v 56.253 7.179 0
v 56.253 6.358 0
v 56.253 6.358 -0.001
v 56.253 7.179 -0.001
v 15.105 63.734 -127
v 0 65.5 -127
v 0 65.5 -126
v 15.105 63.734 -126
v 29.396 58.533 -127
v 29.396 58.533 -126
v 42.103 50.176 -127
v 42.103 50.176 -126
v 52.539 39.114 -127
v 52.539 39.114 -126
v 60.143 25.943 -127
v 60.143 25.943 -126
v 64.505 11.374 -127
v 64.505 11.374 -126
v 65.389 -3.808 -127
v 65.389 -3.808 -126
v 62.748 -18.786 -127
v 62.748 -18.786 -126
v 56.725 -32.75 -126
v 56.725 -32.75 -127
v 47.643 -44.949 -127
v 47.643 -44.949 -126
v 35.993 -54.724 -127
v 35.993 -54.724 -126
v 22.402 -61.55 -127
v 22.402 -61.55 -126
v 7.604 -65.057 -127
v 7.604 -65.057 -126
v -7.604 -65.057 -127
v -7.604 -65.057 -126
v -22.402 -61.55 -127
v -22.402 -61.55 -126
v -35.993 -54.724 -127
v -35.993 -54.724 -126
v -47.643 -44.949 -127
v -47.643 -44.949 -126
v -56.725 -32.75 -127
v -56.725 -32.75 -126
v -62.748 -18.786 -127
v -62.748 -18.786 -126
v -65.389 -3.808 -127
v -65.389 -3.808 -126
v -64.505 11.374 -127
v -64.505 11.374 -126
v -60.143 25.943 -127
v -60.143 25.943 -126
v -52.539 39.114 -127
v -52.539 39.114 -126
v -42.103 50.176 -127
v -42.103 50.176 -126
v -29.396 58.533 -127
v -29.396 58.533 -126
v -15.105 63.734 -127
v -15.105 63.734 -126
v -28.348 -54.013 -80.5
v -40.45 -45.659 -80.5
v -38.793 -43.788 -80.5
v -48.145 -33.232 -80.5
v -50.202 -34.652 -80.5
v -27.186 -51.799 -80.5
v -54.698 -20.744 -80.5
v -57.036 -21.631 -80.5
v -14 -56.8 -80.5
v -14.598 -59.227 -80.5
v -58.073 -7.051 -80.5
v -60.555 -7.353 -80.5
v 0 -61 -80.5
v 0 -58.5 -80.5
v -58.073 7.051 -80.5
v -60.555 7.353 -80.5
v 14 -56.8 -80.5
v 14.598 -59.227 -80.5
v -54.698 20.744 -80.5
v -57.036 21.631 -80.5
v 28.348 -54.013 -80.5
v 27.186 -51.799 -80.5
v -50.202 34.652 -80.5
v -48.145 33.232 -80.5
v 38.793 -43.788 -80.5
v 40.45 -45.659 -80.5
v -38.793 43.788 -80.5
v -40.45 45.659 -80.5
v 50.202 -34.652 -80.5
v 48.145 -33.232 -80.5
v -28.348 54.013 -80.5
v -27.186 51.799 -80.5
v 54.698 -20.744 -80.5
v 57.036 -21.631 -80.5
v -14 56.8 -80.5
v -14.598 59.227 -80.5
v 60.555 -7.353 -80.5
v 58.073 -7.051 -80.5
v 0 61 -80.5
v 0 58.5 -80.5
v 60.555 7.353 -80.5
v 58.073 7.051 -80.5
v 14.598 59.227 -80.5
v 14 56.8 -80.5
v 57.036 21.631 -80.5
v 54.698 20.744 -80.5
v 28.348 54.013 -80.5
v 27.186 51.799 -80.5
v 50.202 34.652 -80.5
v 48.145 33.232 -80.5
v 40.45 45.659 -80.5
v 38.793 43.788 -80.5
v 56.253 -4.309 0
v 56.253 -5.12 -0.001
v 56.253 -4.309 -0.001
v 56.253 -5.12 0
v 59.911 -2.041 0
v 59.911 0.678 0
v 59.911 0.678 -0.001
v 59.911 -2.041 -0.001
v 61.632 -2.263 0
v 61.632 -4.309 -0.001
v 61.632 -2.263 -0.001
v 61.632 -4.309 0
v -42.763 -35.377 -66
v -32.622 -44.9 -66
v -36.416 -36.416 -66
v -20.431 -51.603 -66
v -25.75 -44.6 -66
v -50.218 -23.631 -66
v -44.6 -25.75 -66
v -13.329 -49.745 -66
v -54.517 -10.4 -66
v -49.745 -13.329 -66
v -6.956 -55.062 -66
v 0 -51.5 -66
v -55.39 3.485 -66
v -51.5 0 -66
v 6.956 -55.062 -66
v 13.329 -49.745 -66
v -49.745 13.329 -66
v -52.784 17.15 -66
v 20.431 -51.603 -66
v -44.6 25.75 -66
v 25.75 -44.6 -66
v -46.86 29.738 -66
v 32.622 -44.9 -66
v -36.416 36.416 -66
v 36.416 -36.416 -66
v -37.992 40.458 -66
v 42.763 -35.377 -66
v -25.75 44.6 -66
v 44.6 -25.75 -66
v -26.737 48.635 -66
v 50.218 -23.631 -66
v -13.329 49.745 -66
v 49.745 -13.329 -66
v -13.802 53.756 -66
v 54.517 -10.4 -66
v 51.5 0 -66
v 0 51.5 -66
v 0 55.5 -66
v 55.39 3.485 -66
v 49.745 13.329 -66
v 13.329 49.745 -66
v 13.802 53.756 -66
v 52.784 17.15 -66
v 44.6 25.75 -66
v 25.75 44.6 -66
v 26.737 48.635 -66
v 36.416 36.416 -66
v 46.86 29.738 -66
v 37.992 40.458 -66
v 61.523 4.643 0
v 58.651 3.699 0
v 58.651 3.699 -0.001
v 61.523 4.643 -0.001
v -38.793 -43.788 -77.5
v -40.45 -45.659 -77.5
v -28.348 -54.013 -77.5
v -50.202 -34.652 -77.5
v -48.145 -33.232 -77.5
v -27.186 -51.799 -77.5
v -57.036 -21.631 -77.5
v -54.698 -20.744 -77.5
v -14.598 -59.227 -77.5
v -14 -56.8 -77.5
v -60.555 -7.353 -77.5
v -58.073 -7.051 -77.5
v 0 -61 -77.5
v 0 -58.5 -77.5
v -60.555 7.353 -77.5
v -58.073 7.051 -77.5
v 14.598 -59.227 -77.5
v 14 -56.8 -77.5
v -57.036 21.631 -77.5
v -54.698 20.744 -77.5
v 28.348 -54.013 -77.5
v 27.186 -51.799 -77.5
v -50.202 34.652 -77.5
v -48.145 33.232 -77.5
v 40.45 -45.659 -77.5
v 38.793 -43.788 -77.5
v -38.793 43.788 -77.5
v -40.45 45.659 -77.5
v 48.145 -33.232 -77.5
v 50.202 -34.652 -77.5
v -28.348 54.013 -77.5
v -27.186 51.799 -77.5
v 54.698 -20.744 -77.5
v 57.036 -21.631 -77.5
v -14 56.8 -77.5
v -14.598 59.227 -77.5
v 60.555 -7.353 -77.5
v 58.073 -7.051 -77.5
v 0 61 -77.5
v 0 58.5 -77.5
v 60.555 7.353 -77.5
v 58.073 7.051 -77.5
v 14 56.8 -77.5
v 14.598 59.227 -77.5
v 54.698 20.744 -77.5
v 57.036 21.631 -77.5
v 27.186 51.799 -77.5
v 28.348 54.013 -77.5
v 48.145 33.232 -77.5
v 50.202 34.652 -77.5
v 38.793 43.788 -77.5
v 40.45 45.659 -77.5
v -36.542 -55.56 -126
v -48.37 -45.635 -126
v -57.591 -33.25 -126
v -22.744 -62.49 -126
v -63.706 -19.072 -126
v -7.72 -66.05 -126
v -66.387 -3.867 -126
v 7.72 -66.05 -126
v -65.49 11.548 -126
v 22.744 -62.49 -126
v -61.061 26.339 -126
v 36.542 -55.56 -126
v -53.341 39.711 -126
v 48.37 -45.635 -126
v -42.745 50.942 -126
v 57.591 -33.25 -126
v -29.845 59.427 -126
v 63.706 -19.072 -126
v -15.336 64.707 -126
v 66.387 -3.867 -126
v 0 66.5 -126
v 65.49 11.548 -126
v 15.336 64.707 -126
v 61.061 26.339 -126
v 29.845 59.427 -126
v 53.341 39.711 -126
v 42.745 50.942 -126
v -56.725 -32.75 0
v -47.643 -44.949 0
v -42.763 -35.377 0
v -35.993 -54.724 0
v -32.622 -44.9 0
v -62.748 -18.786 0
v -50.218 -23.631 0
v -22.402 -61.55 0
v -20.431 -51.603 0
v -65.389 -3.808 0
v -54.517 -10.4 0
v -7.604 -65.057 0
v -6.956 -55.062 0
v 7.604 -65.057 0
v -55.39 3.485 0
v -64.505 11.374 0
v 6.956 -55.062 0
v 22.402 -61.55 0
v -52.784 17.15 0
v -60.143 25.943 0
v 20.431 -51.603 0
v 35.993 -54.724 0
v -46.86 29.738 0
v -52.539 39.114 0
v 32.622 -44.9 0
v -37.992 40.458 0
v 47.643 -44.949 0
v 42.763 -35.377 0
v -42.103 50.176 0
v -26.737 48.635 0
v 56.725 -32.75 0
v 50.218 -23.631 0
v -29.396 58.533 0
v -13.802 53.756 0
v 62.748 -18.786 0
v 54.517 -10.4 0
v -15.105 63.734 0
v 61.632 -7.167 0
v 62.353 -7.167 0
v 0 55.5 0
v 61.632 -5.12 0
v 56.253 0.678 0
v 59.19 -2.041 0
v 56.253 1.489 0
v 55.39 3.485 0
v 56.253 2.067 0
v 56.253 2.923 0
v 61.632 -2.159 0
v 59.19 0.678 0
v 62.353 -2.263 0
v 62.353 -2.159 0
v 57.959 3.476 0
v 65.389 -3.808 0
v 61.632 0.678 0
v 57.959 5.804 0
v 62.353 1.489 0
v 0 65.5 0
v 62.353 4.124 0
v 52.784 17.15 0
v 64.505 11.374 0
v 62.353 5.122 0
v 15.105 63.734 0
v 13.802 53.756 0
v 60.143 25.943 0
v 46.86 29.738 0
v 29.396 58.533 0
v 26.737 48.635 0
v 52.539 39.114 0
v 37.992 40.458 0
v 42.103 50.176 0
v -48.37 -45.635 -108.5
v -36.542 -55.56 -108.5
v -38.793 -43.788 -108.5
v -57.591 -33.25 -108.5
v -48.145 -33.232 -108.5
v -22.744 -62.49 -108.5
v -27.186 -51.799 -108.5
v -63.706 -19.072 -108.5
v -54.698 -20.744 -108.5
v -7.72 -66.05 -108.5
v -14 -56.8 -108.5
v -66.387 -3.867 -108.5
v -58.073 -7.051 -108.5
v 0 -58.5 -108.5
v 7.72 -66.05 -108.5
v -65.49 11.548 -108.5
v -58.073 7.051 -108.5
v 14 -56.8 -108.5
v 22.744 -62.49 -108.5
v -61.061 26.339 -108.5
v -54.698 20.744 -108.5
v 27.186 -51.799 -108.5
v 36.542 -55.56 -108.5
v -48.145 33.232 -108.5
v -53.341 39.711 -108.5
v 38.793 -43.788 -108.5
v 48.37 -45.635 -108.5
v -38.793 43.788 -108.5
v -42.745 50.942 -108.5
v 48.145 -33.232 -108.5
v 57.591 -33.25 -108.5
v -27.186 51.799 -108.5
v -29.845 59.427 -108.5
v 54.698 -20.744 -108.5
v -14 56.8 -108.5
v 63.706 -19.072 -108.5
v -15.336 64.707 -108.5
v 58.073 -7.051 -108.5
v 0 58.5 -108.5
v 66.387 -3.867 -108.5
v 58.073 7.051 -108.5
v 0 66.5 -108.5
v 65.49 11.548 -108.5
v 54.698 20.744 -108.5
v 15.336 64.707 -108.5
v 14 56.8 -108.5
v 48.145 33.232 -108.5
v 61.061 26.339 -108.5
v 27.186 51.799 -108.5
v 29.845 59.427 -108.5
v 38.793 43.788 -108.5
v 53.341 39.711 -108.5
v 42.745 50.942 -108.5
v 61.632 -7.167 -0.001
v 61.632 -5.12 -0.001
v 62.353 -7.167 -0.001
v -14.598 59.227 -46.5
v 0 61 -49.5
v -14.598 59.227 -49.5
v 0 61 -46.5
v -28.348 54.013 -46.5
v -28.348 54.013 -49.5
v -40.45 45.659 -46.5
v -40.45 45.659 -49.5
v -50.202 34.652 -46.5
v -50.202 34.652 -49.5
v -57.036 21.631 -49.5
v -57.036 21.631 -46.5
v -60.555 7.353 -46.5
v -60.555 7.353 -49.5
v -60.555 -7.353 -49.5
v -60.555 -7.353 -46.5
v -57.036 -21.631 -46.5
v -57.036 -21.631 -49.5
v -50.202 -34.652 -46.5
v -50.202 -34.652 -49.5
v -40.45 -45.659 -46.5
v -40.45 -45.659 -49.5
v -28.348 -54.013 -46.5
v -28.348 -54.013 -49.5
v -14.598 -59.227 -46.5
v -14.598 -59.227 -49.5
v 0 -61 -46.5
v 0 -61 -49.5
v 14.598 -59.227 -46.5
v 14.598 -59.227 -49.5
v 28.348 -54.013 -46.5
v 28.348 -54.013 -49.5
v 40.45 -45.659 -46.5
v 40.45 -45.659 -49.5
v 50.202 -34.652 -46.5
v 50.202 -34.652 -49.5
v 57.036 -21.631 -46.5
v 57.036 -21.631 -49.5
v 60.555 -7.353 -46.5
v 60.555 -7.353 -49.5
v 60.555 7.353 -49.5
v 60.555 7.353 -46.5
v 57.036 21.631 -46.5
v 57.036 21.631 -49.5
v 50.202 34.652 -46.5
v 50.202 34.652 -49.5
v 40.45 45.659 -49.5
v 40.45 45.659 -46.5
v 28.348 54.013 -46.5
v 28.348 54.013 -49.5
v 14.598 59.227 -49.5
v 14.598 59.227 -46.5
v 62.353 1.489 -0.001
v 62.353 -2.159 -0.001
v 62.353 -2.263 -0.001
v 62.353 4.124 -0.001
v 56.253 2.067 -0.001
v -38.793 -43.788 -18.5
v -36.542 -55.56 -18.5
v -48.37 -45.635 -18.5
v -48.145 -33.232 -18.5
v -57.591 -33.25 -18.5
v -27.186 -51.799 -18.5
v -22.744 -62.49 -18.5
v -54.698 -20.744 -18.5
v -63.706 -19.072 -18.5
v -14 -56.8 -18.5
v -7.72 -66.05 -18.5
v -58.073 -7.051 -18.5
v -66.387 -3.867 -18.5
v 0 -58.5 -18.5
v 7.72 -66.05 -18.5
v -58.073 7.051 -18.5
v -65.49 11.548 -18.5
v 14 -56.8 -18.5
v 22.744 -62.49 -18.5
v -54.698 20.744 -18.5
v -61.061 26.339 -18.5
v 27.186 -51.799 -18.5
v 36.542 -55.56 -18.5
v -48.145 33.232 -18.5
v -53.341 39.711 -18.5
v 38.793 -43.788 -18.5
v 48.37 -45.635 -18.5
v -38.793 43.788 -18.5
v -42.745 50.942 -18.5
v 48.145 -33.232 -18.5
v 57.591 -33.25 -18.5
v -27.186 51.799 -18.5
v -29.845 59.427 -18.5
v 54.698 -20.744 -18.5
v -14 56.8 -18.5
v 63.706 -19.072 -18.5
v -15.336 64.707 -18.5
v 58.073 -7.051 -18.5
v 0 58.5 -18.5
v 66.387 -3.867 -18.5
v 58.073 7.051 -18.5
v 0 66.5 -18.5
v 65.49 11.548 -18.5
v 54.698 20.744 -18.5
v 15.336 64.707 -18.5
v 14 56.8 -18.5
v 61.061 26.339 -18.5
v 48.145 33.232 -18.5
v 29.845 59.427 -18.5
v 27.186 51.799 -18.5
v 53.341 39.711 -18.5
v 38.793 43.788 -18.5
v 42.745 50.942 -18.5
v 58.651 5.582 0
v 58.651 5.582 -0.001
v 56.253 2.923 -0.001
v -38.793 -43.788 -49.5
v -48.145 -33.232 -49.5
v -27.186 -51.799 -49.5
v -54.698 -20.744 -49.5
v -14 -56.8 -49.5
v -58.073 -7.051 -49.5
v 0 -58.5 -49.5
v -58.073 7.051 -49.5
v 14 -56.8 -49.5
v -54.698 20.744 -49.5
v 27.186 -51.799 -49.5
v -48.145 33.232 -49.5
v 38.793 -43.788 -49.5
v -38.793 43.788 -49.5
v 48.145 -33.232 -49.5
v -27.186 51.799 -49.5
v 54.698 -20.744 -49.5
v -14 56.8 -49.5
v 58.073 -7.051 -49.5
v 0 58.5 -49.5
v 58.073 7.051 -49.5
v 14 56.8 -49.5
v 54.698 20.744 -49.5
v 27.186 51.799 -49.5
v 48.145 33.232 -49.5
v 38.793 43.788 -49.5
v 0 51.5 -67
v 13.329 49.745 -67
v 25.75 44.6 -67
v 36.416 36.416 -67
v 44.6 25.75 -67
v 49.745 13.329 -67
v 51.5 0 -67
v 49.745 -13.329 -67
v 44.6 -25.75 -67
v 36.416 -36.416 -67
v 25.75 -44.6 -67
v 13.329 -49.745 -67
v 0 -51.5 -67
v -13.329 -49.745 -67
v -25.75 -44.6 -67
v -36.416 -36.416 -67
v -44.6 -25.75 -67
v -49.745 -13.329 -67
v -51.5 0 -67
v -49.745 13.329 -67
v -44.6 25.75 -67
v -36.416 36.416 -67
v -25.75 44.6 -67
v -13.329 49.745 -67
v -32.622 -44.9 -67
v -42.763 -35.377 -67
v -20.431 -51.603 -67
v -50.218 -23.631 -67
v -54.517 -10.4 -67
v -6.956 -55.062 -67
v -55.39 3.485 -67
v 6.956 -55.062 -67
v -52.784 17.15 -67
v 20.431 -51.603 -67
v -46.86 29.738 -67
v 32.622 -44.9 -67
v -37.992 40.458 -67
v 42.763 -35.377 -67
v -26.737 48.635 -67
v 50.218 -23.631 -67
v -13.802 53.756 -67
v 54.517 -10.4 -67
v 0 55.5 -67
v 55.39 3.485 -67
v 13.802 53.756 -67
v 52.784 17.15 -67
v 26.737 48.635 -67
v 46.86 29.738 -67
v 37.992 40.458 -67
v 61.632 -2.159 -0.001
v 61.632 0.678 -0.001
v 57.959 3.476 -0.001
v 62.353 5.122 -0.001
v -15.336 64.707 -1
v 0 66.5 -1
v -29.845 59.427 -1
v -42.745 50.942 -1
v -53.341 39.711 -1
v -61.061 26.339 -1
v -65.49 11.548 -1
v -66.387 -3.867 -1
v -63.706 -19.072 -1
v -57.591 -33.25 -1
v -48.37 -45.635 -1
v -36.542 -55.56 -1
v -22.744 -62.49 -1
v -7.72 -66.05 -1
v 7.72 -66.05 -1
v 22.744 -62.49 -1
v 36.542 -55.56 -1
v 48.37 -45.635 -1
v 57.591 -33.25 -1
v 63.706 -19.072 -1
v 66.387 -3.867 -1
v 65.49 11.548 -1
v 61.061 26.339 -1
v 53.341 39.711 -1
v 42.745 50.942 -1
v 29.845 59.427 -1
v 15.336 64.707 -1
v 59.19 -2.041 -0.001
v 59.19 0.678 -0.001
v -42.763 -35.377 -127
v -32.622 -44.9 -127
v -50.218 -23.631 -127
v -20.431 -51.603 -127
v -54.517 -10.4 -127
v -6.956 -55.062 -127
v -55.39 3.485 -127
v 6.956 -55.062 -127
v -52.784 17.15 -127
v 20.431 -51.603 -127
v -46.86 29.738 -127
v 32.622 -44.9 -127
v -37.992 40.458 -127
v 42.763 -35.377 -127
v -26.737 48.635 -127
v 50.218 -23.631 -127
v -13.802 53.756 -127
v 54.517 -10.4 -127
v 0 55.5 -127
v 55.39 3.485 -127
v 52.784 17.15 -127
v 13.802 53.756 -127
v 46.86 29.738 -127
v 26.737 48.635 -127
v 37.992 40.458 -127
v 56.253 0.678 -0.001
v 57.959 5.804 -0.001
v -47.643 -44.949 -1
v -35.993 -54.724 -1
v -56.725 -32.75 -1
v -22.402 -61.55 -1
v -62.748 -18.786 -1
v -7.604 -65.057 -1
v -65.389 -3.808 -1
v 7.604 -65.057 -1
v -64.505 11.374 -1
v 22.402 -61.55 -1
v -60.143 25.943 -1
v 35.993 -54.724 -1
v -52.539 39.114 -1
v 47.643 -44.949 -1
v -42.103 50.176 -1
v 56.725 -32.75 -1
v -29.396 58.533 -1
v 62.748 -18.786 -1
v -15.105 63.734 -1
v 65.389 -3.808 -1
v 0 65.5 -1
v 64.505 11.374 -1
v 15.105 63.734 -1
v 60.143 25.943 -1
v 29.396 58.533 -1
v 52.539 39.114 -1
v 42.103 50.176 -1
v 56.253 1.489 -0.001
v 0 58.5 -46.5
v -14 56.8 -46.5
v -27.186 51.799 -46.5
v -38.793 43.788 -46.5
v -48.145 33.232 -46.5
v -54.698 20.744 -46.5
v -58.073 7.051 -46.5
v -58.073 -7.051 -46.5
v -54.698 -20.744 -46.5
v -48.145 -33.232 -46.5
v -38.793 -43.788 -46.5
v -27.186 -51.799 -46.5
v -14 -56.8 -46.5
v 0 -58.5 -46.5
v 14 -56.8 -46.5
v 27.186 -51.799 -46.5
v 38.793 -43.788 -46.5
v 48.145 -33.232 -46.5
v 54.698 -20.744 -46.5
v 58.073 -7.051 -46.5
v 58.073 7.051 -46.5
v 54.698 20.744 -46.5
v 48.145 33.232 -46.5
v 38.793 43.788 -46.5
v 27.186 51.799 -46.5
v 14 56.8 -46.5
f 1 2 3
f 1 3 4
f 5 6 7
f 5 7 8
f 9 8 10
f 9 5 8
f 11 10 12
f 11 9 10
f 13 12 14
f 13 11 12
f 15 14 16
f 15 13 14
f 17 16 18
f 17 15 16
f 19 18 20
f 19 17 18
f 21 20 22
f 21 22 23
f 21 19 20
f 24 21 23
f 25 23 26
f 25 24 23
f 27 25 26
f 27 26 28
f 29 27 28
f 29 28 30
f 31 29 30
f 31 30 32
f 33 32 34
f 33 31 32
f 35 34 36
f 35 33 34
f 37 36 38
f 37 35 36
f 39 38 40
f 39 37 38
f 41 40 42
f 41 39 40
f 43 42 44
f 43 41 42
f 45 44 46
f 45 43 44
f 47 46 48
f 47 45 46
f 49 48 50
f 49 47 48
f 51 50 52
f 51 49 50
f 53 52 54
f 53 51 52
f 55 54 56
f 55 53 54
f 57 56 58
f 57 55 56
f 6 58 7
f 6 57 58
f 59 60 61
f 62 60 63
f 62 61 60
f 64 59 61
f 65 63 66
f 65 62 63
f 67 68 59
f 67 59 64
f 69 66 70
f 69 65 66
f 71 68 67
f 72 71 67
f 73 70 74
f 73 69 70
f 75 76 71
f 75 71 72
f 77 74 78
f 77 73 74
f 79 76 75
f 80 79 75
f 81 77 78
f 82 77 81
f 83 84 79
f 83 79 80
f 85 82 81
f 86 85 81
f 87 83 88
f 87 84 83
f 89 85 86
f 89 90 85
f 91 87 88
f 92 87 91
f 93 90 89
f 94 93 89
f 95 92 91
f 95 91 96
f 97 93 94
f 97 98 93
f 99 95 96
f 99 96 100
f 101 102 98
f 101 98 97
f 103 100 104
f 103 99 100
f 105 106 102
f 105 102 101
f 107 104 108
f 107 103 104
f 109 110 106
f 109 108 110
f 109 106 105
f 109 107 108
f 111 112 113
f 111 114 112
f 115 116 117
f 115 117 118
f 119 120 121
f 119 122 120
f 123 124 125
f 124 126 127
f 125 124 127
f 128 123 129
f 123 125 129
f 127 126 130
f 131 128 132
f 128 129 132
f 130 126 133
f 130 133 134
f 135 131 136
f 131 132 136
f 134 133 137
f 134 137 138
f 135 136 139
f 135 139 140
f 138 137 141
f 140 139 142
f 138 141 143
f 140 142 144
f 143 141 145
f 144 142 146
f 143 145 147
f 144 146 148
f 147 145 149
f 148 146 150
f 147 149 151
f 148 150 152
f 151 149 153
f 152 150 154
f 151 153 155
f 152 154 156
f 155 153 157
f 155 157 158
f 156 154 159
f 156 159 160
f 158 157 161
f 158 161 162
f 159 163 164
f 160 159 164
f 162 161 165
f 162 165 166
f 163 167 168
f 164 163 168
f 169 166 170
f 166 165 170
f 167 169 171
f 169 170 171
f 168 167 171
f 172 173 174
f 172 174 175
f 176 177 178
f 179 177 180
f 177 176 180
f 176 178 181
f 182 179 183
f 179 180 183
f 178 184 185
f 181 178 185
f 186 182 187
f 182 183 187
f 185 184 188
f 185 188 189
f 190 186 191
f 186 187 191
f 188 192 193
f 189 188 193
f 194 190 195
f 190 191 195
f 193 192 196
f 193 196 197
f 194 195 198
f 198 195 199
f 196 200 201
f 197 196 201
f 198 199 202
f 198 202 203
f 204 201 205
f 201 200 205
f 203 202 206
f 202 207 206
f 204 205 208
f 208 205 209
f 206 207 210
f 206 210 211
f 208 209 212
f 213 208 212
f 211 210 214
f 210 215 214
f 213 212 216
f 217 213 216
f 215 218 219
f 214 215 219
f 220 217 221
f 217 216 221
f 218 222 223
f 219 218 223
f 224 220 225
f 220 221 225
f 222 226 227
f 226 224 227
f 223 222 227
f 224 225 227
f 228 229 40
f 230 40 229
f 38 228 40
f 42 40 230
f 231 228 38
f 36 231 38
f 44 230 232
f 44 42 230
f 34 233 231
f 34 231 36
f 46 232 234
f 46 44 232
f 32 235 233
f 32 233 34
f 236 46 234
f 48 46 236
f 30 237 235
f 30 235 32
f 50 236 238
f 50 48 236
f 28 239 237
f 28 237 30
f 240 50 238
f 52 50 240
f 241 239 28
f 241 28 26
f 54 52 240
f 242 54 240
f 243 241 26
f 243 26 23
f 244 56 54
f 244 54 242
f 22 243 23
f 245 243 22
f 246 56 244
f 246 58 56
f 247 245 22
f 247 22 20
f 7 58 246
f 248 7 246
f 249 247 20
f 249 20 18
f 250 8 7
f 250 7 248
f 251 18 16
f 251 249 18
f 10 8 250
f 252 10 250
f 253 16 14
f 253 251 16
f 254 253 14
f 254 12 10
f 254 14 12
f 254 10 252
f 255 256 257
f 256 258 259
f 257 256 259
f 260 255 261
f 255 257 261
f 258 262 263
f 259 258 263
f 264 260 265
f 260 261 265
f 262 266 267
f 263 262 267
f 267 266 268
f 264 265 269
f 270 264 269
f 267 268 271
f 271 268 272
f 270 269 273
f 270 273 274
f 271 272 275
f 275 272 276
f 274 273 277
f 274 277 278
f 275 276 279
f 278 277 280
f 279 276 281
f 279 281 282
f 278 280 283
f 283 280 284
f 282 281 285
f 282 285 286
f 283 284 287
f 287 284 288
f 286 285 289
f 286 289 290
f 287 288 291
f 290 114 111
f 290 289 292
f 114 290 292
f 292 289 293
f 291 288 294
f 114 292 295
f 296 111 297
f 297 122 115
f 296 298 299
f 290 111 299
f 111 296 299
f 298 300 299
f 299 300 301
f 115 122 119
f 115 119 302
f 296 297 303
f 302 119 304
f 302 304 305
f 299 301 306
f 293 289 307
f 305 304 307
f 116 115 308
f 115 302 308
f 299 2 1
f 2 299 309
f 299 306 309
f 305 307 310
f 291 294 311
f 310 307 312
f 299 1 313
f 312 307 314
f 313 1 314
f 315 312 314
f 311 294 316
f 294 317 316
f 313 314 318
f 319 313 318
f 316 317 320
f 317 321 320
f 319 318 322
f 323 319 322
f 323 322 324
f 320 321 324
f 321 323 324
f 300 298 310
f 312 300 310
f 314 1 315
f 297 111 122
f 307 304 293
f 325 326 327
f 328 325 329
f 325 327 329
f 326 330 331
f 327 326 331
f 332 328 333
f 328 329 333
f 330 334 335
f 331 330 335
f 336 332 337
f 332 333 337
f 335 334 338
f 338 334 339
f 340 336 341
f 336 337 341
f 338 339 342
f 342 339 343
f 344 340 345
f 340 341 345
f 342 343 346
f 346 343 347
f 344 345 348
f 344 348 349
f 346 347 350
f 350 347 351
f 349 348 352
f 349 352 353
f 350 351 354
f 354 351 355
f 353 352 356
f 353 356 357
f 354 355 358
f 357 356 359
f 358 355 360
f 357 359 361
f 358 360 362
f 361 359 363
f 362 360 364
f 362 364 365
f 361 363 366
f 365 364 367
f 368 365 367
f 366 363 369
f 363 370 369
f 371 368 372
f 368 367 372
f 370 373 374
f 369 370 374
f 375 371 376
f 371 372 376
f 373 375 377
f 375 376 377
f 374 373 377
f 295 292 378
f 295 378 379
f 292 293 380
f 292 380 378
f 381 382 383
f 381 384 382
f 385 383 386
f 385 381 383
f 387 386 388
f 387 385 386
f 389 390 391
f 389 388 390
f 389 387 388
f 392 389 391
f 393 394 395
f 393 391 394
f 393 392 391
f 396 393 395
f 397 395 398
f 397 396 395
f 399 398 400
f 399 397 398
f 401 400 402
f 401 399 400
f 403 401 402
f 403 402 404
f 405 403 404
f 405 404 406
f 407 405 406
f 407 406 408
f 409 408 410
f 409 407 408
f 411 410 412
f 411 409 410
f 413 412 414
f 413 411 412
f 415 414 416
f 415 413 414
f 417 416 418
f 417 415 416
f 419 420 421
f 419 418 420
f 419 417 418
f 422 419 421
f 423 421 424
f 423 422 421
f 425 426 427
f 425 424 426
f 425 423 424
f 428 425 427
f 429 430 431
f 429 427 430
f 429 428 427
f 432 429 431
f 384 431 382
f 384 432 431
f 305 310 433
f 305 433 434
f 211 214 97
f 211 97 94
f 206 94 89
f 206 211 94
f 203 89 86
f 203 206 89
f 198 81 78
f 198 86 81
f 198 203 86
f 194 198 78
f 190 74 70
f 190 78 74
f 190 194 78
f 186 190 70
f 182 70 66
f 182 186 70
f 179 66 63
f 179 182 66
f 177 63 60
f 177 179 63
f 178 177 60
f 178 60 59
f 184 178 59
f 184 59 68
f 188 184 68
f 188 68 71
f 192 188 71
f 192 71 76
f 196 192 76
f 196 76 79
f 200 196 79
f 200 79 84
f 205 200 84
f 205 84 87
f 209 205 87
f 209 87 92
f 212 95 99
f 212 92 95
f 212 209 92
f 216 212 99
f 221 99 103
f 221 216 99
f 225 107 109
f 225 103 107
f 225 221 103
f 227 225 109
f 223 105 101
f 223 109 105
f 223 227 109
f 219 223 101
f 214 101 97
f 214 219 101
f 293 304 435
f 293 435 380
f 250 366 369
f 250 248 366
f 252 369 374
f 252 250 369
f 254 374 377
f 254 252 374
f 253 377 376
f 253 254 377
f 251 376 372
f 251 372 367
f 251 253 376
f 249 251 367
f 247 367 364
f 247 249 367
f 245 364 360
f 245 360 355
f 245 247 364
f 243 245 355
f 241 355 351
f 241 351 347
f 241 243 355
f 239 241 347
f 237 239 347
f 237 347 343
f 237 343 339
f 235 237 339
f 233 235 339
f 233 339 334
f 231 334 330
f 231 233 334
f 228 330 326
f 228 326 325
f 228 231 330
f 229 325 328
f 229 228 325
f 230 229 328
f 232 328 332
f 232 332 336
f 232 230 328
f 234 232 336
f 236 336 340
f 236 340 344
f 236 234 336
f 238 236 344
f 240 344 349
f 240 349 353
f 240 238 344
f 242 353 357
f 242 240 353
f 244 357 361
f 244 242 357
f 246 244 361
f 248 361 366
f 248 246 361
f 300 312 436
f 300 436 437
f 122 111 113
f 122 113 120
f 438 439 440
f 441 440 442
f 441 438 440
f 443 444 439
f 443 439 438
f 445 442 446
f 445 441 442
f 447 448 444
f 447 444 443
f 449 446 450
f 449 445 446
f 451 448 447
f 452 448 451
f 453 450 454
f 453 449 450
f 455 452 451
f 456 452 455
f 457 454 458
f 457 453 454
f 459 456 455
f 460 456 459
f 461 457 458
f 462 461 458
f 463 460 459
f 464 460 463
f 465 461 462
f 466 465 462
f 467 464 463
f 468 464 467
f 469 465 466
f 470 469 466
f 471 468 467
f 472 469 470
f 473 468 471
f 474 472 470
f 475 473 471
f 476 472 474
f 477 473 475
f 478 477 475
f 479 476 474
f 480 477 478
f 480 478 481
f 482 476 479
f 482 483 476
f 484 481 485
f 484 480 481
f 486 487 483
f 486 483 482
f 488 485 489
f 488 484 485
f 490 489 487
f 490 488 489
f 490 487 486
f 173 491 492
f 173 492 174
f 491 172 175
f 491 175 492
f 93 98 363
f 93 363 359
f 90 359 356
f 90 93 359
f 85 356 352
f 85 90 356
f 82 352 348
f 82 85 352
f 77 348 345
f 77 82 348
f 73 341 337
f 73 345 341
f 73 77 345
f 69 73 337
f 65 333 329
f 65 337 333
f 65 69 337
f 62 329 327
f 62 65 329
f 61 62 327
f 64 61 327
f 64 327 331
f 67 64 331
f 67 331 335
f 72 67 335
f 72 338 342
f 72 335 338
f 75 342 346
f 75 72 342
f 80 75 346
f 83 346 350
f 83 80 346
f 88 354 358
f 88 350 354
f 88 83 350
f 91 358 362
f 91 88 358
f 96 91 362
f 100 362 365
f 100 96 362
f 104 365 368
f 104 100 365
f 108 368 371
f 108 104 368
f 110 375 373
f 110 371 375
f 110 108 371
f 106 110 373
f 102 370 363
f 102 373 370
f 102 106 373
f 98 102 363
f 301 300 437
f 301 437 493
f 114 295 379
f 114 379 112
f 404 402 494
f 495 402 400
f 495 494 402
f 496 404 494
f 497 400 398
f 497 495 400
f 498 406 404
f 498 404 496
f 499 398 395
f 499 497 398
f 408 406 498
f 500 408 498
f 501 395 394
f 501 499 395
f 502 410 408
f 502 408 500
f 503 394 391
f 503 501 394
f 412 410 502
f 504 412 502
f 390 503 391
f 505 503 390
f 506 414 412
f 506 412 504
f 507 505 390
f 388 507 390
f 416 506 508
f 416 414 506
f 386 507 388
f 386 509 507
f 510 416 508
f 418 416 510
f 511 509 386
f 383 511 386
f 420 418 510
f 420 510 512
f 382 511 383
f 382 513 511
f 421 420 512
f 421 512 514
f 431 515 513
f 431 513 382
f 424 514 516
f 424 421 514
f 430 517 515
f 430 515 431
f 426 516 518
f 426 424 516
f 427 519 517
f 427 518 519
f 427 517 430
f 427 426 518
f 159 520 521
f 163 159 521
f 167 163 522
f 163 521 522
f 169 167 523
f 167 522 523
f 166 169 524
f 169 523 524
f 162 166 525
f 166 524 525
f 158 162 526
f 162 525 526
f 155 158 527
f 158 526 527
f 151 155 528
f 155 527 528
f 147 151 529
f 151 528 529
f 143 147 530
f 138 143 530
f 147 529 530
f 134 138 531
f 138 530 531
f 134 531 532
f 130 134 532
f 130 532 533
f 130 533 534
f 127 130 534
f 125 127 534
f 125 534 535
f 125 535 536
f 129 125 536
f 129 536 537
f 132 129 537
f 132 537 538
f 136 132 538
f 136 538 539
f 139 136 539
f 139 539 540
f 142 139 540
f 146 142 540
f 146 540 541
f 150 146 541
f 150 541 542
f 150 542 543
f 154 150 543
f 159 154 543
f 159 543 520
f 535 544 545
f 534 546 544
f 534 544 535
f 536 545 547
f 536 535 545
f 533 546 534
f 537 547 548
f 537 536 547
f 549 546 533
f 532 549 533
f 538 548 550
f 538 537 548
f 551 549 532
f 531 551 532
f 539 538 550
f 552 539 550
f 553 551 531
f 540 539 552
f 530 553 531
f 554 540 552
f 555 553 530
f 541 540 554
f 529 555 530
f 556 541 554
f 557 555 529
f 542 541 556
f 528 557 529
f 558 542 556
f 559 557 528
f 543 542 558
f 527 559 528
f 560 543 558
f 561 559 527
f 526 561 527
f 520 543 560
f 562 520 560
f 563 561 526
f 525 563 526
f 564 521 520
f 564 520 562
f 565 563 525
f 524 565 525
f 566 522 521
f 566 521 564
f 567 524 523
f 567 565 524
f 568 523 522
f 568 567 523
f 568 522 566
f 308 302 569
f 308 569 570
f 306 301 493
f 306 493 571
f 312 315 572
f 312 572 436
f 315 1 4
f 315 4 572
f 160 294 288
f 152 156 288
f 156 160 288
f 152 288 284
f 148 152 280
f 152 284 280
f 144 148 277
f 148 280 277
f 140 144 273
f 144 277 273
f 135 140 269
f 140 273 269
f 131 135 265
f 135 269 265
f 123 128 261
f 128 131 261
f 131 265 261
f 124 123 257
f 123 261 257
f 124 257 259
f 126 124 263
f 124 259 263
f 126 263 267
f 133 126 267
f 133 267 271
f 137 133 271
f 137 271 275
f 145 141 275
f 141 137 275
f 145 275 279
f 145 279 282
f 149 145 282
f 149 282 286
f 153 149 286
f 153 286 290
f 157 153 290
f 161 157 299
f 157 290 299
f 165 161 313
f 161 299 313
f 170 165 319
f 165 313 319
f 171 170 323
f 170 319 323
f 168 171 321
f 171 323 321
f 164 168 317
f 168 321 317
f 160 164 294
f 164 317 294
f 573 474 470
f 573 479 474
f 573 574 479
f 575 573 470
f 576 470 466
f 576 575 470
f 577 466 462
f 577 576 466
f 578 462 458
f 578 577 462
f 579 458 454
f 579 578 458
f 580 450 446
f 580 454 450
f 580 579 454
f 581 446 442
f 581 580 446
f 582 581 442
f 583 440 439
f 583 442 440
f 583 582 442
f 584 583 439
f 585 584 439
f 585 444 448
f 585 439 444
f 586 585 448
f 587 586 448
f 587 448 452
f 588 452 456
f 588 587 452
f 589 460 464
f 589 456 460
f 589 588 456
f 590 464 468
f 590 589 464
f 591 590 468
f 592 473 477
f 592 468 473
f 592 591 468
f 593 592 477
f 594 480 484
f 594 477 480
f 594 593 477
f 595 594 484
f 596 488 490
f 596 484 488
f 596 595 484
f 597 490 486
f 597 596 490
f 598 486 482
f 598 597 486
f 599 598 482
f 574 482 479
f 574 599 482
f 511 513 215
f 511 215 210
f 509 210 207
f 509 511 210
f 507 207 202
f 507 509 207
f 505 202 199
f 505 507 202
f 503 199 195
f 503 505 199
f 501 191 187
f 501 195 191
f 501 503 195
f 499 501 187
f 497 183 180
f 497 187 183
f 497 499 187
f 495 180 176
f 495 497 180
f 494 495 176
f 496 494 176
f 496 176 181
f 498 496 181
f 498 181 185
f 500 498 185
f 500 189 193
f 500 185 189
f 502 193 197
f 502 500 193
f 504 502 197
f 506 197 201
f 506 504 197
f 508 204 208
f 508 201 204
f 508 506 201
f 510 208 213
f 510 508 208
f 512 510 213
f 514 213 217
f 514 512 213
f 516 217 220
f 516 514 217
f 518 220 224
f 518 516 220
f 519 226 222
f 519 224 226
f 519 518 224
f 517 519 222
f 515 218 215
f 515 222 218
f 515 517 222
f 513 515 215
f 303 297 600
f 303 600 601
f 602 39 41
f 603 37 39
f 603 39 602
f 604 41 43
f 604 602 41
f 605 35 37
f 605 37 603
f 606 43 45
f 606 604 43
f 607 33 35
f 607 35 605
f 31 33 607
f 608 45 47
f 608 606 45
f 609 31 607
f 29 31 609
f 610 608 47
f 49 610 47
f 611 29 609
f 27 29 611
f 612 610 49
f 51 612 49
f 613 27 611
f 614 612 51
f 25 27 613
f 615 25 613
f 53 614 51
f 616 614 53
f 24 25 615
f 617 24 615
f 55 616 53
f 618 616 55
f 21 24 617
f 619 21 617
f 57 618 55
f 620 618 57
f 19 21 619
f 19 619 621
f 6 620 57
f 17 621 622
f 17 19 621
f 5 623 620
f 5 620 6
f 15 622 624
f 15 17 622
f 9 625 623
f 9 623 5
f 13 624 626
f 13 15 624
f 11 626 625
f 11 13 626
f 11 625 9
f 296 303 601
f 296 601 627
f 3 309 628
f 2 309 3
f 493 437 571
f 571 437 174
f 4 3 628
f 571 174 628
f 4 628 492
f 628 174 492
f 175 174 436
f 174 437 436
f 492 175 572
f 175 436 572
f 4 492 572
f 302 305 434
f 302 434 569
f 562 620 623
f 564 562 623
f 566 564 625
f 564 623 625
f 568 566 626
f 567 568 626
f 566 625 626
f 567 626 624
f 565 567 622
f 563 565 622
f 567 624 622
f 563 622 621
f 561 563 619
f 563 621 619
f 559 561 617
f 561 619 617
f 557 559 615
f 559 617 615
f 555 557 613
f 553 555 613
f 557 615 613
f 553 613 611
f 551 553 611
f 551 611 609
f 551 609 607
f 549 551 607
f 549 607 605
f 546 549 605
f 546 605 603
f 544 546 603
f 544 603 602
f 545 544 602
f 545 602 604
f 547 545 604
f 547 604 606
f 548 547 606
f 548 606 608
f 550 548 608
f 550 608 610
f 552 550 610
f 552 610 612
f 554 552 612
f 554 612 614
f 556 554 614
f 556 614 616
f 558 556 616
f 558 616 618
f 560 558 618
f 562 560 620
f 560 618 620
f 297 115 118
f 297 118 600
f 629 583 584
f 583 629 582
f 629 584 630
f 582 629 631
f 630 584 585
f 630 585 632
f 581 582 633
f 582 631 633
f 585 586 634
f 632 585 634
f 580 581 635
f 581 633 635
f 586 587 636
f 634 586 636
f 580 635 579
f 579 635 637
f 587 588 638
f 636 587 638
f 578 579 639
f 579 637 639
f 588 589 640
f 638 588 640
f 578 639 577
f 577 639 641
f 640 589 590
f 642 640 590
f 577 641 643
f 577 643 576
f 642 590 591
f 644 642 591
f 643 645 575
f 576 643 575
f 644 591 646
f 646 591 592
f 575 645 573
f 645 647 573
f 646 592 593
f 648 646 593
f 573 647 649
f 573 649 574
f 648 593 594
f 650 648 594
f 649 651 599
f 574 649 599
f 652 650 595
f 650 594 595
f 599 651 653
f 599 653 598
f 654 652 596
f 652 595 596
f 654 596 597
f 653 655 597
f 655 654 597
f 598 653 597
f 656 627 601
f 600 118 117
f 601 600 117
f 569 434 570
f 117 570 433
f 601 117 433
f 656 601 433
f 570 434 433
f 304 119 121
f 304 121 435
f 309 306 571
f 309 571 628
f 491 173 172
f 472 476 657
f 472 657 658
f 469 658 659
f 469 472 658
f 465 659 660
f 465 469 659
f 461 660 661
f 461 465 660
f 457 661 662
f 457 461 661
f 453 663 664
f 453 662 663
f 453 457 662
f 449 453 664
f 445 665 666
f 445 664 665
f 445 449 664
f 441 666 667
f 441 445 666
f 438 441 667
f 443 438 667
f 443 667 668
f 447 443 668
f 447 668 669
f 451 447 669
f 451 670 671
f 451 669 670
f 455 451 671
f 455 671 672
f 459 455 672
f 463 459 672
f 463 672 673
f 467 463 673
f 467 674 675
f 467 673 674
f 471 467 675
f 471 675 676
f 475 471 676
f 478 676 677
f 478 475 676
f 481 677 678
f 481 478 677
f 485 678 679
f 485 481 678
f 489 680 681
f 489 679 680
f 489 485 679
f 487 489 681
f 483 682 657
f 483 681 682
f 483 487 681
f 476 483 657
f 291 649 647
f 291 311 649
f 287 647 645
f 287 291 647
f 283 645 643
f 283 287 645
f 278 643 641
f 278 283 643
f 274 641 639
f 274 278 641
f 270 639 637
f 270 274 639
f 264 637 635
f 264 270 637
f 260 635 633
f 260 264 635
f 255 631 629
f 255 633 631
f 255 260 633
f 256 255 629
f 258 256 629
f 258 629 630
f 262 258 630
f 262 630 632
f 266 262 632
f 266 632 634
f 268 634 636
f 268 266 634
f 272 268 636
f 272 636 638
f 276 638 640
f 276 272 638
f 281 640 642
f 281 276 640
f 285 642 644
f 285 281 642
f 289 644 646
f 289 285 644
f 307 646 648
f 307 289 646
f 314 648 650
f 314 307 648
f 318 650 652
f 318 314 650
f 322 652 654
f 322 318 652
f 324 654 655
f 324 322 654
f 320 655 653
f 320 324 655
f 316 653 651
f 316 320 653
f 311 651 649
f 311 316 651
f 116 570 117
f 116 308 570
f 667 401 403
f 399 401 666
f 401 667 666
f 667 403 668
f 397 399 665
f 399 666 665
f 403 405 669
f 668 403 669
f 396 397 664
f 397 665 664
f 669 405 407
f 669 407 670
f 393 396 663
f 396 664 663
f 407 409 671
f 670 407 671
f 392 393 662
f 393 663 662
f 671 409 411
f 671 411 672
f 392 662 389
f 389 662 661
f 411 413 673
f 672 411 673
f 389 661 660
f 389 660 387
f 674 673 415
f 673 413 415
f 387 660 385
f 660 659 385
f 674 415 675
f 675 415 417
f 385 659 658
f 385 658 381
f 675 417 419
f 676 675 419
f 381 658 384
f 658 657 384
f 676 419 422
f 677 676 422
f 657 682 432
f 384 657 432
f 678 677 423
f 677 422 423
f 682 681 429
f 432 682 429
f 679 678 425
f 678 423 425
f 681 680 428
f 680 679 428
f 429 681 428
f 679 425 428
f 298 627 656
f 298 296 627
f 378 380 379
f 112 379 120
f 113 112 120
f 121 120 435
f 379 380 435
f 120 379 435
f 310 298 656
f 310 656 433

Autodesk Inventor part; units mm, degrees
ref_plane "YZ Plane" through (0, 0, 0) normal (1, 0, 0) x (0, 1, 0)
ref_plane "XZ Plane" through (0, 0, 0) normal (0, 1, 0) x (-1, 0, 0)
ref_plane "XY Plane" through (0, 0, 0) normal (0, 0, 1) x (1, 0, 0)
sketch "Sketch1" plane through (0, 0, 0) normal (1, 0, 0) x (0, 1, 0)
  line L0 (0, 0) -> (0, -141.6259) construction
  line L1 (-13.3, 0) -> (79.8, 0) construction
  line L2 (55.5, -66.5) -> (25.7904, -66.5) construction
  line L3 (51.5, -66) -> (51.5, -67)
  line L4 (51.5, -66) -> (55.5, -66)
  line L5 (55.5, -66) -> (55.5, 0)
  line L6 (51.5, -67) -> (55.5, -67)
  line L7 (55.5, -67) -> (55.5, -127)
  line L8 (66.5, -108.5) -> (58.5, -108.5)
  line L9 (58.5, -108.5) -> (58.5, -80.5)
  line L10 (58.5, -80.5) -> (61, -80.5)
  line L11 (61, -80.5) -> (61, -77.5)
  line L12 (61, -77.5) -> (58.5, -77.5)
  line L13 (58.5, -77.5) -> (58.5, -49.5)
  line L14 (58.5, -49.5) -> (61, -49.5)
  line L15 (61, -49.5) -> (61, -46.5)
  line L16 (61, -46.5) -> (58.5, -46.5)
  line L17 (58.5, -46.5) -> (58.5, -18.5)
  line L18 (58.5, -18.5) -> (66.5, -18.5)
  line L19 (66.5, -18.5) -> (66.5, -1)
  line L20 (66.5, -1) -> (65.5, -1)
  line L21 (65.5, -1) -> (65.5, 0)
  line L22 (65.5, 0) -> (55.5, 0)
  line L23 (66.5, -108.5) -> (66.5, -126)
  line L24 (66.5, -126) -> (65.5, -126)
  line L25 (65.5, -126) -> (65.5, -127)
  line L26 (65.5, -127) -> (55.5, -127)
  point P0 (51.5, -66.5)
  dimension "d2" = 1
  dimension "d3" = 103
  dimension "d4" = 66
  dimension "d5" = 111
  dimension "d6" = 60
  dimension "d9" = 8
  dimension "d10" = 28
  dimension "d11" = 2.5
  dimension "d12" = 3
  dimension "d13" = 28
  dimension "d14" = 2.5
  dimension "d15" = 3
  dimension "d16" = 28
  dimension "d17" = 8
  dimension "d19" = 17.5
  dimension "d20" = 1
  dimension "d21" = 17.5
  dimension "d22" = 1
  dimension "d23" = 3
  dimension "d24" = 1
  dimension "d25" = 1
revolve "Revolution1" add sketch "Sketch1" angle 360 about axis through (0, 0, 0) along (0, 0, -1)
sketch "Sketch2" plane through (0, 0, 0) normal (0, 0, 1) x (1, 0, 0)
  line L0 (62.3533, 7.1392) -> (62.3533, -1.0719) construction
  line L1 (62.3533, -1.0719) -> (58.8533, -1.0719) construction
  line L2 (58.8533, -1.0719) -> (58.8533, 7.1392) construction
  line L3 (58.8533, 7.1392) -> (62.3533, 7.1392) construction
  line L4 (56.2533, 7.1788) -> (62.3533, 5.1223)
  line L5 (62.3533, 5.1223) -> (62.3533, 4.1238)
  line L6 (62.3533, 4.1238) -> (56.2533, 2.0674)
  line L7 (56.2533, 2.0674) -> (56.2533, 2.9226)
  line L8 (56.2533, 2.9226) -> (57.9587, 3.4762)
  line L9 (57.9587, 3.4762) -> (57.9587, 5.8045)
  line L10 (57.9587, 5.8045) -> (56.2533, 6.3582)
  line L11 (56.2533, 6.3582) -> (56.2533, 7.1788)
  line L12 (58.6507, 3.6987) -> (61.5228, 4.6429)
  line L13 (61.5228, 4.6429) -> (58.6507, 5.5821)
  line L14 (58.6507, 5.5821) -> (58.6507, 3.6987)
  line L15 (61.6315, -2.1591) -> (61.6315, 0.6783)
  line L16 (61.6315, 0.6783) -> (59.9113, 0.6783)
  line L17 (59.9113, 0.6783) -> (59.9113, -2.0405)
  line L18 (59.9113, -2.0405) -> (59.1896, -2.0405)
  line L19 (59.1896, -2.0405) -> (59.1896, 0.6783)
  line L20 (59.1896, 0.6783) -> (56.2533, 0.6783)
  line L21 (56.2533, 0.6783) -> (56.2533, 1.489)
  line L22 (56.2533, 1.489) -> (62.3533, 1.489)
  line L23 (62.3533, 1.489) -> (62.3533, -2.1591)
  line L24 (62.3533, -2.1591) -> (61.6315, -2.1591)
  line L25 (56.2533, -4.3094) -> (61.6315, -4.3094)
  line L26 (61.6315, -4.3094) -> (61.6315, -2.2629)
  line L27 (61.6315, -2.2629) -> (62.3533, -2.2629)
  line L28 (62.3533, -2.2629) -> (62.3533, -7.1666)
  line L29 (62.3533, -7.1666) -> (61.6315, -7.1666)
  line L30 (61.6315, -7.1666) -> (61.6315, -5.1201)
  line L31 (61.6315, -5.1201) -> (56.2533, -5.1201)
  line L32 (56.2533, -5.1201) -> (56.2533, -4.3094)
  point P0 (0, 0)
emboss "Emboss1" sketch "Sketch2" operation cut depth 0.001 direction (0, 0, -1)
equation "\"d22\" = d20"
equation "\"d24\" = d20"
equation "\"d25\" = d24"
properties part number "doubleSocketPipe" material "PVC-Piping"
